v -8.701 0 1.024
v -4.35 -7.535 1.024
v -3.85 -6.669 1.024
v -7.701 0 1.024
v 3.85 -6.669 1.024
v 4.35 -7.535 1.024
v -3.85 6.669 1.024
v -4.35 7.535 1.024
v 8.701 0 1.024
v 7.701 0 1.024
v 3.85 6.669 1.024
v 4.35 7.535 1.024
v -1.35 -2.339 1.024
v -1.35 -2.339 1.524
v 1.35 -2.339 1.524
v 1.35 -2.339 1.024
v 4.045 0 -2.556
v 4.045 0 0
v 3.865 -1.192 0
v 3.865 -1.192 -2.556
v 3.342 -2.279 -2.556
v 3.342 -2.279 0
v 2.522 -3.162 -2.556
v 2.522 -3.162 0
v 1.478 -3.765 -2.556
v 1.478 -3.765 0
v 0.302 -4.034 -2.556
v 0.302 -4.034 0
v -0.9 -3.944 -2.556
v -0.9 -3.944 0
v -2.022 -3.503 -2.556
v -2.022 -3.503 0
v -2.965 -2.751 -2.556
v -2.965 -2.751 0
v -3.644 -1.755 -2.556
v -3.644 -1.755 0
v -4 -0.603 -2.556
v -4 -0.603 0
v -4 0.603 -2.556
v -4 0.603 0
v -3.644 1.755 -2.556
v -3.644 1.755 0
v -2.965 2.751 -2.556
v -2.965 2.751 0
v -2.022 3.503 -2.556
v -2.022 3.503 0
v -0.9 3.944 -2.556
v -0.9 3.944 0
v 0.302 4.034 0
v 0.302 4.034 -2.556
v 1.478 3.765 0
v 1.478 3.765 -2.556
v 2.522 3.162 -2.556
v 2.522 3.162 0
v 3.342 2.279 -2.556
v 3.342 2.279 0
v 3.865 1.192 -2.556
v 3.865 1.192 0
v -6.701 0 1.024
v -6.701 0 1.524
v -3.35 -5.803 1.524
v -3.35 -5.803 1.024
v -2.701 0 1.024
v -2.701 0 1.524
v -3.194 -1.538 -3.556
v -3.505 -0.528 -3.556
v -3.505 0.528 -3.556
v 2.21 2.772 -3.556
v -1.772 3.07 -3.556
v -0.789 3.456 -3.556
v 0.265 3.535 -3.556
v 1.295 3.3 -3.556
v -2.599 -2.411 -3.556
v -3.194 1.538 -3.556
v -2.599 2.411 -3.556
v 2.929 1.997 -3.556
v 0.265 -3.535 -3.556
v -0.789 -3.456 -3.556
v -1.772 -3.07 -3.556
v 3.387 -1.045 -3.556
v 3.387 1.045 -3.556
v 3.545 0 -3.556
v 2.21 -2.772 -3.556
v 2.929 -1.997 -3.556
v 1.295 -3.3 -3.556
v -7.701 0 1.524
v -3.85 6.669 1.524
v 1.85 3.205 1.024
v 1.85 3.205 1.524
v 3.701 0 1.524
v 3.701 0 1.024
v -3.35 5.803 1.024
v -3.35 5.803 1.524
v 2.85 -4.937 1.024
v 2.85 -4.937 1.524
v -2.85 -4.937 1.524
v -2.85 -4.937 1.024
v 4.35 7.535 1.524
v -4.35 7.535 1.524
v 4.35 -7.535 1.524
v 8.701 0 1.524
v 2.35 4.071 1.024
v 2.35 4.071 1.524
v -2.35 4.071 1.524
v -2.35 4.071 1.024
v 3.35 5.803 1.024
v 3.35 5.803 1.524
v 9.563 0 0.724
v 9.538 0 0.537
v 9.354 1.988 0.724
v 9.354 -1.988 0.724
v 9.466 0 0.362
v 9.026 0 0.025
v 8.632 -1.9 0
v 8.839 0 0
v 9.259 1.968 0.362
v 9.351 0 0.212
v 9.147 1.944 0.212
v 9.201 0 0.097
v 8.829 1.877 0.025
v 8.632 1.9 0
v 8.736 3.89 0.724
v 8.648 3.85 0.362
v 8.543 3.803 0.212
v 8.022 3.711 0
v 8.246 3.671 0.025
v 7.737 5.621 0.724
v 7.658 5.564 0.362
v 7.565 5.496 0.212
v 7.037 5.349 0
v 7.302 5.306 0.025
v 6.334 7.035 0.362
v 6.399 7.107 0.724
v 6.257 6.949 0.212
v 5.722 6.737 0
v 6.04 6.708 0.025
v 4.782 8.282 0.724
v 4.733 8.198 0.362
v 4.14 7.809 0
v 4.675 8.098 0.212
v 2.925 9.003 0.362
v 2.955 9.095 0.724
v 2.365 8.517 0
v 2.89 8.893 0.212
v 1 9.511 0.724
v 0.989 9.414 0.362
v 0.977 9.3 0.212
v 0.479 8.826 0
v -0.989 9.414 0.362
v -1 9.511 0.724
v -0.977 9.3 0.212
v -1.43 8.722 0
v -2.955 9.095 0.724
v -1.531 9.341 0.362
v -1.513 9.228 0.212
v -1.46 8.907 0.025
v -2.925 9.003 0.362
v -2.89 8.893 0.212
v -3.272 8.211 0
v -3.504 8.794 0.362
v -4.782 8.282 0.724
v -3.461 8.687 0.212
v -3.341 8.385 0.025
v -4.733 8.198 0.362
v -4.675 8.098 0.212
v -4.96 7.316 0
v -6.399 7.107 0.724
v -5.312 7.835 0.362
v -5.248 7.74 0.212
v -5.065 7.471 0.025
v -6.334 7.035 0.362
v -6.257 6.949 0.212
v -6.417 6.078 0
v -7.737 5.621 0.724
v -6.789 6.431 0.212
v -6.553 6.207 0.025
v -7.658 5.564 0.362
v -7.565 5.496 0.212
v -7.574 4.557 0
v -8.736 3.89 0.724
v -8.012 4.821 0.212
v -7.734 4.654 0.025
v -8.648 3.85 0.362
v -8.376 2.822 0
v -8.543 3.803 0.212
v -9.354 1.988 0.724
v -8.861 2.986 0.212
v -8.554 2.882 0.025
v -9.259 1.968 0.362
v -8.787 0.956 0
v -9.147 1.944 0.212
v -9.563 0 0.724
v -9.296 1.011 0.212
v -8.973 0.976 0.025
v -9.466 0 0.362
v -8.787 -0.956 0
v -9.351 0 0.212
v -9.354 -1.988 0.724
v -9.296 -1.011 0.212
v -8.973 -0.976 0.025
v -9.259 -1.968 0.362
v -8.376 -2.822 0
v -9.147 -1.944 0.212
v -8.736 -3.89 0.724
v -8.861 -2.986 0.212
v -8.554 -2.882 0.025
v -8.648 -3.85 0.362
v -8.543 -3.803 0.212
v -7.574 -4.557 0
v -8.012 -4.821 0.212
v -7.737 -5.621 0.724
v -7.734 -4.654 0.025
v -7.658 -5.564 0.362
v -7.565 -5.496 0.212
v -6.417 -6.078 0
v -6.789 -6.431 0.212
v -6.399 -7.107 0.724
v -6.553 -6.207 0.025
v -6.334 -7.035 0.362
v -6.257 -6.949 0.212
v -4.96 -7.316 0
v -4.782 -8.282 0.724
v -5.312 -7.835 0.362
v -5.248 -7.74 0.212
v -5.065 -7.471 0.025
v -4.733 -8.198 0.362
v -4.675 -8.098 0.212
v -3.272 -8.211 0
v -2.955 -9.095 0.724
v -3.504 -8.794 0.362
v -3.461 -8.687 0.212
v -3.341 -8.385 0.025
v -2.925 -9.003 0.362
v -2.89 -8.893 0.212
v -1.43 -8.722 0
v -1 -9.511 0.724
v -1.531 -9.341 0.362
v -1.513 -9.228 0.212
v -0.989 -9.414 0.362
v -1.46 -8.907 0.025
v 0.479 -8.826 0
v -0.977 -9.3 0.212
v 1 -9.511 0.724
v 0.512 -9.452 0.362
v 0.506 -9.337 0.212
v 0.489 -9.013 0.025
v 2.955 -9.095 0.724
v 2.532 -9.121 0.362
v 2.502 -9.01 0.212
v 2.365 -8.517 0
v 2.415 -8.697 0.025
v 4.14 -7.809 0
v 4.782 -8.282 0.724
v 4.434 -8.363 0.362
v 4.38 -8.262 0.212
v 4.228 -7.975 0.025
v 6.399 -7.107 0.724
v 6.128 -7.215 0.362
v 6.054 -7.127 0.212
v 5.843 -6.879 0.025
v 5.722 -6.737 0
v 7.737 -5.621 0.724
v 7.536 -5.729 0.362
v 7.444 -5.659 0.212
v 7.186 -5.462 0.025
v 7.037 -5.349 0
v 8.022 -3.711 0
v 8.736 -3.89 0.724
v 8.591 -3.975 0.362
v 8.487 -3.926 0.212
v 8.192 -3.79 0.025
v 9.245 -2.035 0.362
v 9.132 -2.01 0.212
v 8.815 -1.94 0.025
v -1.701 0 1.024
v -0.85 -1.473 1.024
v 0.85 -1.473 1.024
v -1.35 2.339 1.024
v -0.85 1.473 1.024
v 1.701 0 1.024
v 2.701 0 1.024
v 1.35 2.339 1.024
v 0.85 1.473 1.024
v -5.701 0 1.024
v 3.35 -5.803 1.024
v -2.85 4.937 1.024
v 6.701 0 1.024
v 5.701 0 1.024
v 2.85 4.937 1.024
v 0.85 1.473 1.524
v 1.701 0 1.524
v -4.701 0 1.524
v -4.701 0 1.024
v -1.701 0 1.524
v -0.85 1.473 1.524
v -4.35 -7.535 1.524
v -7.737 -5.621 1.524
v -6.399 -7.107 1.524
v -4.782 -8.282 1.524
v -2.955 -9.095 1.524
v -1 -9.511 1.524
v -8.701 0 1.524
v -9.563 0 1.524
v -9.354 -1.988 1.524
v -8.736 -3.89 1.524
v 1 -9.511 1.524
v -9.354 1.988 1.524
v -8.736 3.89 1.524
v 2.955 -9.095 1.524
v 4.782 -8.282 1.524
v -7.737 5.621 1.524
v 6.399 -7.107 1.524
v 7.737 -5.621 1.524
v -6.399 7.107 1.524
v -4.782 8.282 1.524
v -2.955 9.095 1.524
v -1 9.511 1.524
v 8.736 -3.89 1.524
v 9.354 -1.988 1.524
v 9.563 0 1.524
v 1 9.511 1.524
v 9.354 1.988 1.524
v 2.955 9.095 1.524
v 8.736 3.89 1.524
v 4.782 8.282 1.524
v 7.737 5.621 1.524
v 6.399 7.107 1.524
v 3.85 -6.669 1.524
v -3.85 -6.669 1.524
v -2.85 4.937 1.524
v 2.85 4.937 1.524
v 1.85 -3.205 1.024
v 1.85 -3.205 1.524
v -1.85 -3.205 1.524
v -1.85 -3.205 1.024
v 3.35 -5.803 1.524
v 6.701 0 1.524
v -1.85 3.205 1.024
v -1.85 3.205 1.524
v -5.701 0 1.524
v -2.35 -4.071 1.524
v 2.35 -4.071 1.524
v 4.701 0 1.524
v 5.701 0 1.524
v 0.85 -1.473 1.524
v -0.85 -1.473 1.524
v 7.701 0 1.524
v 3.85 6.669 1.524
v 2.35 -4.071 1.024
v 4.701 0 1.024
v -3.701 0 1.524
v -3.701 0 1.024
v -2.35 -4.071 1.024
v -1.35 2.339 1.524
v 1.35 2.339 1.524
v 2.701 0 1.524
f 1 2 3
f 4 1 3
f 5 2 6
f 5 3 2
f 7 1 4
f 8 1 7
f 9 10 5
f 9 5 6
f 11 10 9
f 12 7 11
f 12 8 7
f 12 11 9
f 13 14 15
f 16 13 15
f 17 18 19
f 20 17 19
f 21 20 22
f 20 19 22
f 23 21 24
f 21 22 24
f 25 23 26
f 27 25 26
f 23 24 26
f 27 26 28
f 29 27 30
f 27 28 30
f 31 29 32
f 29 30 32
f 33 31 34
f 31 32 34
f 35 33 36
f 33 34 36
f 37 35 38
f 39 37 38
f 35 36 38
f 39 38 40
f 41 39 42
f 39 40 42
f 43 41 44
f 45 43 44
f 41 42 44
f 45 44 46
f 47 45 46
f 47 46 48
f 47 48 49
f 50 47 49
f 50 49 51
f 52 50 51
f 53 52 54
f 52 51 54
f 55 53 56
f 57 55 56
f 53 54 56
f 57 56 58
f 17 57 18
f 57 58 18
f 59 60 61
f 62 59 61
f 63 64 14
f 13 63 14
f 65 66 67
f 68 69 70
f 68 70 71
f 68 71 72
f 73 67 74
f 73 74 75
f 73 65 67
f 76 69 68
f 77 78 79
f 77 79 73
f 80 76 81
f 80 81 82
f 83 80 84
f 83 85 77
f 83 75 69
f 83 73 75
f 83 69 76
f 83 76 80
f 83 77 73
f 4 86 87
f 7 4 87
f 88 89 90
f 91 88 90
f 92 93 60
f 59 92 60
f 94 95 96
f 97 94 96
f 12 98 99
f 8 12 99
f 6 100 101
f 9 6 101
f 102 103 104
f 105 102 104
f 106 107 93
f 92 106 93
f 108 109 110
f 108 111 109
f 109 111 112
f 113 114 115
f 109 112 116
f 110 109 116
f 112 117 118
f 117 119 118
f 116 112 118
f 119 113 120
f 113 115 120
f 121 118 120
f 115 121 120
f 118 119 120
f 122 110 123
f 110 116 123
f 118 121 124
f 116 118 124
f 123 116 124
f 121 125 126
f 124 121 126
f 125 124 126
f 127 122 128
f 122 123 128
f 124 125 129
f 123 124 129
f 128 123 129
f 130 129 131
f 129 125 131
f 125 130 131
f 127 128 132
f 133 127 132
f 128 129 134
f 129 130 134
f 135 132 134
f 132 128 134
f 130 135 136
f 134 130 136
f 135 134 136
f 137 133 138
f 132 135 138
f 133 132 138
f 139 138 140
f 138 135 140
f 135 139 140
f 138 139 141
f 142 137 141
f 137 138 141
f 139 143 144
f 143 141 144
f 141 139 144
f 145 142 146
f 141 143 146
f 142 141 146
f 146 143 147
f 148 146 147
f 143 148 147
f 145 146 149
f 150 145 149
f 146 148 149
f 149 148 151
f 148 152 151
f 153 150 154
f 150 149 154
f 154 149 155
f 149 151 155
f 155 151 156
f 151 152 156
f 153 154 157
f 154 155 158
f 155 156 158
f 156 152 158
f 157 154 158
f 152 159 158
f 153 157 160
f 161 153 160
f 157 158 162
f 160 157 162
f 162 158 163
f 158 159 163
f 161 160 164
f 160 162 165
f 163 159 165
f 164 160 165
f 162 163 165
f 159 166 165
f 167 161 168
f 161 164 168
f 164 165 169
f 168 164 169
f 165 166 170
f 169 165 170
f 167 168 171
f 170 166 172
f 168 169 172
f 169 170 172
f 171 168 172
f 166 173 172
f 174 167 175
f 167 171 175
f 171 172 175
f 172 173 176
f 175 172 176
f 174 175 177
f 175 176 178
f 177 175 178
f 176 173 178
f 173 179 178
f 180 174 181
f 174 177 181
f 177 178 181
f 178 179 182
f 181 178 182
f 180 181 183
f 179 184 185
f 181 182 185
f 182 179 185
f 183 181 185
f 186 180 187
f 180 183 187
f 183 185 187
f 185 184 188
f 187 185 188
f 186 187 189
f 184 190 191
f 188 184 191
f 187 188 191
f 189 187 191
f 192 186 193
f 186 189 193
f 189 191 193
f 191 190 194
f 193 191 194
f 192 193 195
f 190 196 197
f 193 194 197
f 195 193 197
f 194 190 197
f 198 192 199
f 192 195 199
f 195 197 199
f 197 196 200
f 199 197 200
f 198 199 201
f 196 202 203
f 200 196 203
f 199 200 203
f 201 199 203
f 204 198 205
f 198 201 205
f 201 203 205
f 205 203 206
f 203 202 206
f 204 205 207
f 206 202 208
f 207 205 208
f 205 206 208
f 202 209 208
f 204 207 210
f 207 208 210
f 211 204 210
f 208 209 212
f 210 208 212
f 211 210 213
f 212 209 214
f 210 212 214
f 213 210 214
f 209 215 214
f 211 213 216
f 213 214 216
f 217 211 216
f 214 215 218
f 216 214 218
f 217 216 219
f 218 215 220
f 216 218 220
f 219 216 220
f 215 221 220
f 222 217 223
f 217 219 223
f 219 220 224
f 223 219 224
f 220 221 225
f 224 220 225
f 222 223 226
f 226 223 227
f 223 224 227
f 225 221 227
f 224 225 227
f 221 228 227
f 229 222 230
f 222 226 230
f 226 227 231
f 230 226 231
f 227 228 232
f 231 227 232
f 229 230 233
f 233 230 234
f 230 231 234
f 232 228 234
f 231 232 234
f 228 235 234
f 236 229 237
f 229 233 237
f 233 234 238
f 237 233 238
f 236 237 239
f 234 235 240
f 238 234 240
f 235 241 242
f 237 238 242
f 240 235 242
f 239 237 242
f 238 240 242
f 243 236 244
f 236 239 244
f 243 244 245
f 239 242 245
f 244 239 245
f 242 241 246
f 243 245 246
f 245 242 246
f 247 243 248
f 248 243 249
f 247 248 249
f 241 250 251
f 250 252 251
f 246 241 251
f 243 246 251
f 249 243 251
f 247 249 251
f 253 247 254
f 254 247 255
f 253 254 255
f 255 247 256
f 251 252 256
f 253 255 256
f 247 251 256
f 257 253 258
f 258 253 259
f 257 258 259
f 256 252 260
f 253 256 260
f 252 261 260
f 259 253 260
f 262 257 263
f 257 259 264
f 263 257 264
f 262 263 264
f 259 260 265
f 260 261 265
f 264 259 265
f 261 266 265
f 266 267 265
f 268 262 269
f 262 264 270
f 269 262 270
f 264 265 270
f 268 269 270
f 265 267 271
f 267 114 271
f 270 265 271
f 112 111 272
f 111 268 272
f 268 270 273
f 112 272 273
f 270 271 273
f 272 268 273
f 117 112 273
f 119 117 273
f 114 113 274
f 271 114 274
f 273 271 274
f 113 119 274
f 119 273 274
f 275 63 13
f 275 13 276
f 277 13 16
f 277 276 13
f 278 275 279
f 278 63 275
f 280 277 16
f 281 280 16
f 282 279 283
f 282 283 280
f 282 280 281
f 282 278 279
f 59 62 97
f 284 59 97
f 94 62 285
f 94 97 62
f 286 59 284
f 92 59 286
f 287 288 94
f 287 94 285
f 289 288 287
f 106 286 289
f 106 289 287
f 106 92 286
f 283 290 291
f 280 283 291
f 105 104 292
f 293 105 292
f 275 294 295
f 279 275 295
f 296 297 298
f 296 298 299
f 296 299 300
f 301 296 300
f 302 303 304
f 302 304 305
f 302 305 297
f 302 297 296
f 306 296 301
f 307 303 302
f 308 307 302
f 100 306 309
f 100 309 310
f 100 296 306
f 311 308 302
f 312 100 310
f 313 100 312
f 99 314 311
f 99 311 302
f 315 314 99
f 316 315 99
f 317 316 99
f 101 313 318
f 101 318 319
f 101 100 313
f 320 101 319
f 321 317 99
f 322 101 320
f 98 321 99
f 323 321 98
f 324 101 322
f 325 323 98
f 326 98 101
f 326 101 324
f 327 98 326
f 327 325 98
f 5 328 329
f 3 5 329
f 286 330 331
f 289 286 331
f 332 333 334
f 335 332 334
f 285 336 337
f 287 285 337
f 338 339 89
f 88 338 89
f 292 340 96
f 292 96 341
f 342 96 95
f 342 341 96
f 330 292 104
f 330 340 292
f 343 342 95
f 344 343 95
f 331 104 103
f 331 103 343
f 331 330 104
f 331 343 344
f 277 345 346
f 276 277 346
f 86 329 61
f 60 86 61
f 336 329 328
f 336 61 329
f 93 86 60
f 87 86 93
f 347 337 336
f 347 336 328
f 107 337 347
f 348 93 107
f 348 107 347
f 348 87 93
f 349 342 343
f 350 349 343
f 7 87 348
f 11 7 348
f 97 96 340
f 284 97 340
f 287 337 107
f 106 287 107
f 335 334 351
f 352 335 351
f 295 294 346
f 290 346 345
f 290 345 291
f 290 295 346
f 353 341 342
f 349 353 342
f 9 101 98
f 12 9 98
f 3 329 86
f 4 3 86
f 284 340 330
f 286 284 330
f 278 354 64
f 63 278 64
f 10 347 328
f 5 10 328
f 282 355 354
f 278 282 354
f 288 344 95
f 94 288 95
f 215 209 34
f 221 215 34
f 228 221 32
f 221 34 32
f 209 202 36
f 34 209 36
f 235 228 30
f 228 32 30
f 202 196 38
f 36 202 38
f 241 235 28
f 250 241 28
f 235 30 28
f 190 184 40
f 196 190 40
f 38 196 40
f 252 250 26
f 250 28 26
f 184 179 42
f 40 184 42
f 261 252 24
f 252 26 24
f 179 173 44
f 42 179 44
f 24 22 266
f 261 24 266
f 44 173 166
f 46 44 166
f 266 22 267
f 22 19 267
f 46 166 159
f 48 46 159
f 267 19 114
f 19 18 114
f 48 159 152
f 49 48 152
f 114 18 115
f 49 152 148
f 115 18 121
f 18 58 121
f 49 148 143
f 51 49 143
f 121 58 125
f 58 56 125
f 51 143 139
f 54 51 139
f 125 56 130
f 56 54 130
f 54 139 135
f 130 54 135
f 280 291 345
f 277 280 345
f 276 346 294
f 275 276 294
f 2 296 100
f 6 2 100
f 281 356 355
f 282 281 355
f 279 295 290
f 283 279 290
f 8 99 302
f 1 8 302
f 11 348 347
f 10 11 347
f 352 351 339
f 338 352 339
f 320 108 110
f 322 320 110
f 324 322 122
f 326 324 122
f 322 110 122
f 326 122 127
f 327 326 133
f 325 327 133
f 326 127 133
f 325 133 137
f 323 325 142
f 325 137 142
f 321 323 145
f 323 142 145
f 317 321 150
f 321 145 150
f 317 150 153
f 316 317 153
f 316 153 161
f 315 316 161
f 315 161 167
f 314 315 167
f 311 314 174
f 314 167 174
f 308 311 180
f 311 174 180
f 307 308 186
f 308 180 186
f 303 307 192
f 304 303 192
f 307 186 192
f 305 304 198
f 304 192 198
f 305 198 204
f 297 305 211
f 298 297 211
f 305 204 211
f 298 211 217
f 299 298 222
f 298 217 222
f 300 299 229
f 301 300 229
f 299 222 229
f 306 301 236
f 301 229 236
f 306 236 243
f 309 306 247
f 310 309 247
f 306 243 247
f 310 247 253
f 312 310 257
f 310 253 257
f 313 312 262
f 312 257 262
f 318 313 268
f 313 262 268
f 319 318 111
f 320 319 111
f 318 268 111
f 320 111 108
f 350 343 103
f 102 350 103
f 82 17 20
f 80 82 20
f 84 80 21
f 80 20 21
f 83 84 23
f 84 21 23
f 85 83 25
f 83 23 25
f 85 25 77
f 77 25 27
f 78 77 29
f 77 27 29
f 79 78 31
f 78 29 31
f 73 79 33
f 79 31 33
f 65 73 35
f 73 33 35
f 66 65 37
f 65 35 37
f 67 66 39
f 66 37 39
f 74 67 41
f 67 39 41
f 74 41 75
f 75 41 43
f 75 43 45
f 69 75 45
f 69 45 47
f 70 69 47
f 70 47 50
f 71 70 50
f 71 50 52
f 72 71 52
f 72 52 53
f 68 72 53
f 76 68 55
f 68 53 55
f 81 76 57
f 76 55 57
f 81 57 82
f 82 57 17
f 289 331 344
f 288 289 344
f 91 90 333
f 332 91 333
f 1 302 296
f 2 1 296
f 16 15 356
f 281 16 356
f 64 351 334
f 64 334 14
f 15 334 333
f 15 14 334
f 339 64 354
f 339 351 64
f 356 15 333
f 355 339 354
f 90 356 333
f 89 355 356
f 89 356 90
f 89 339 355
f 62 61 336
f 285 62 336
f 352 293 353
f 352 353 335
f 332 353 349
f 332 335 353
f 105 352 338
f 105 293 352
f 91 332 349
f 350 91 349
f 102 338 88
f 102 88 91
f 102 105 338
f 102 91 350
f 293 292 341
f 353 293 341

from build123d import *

# Parameters (mm, degrees)
F0_R     = 9.5631
F1_DEPTH = 1.524
F3_DEPTH = 0.5
F4_R     = 4.04495
F5_DEPTH = 3.556
F6_R     = 0.7242640687
F7_SIZE2 = 1
F7_SIZE  = 0.5


with BuildPart() as f1:
    # F0 (on Top) → F1 (new body)
    with BuildSketch(Plane.XY):
        Circle(F0_R)
    extrude(amount=F1_DEPTH)

    # F2 (on face) → F3 (cut)
    with BuildSketch(Plane.XY.offset(1.524)):
        Polygon((8.7007693222, 0), (4.3503846611, 7.5350872655), (-4.3503846611, 7.5350872655), (-8.7007693222, 0), (-4.3503846611, -7.5350872655), (4.3503846611, -7.5350872655), align=None)
        Polygon((-7.7007693222, 0), (-3.8503846611, 6.6690618617), (3.8503846611, 6.6690618617), (7.7007693222, 0), (3.8503846611, -6.6690618617), (-3.8503846611, -6.6690618617), align=None, mode=Mode.SUBTRACT)
        Polygon((3.3503846611, 5.8030364579), (-3.3503846611, 5.8030364579), (-6.7007693222, 0), (-3.3503846611, -5.8030364579), (3.3503846611, -5.8030364579), (6.7007693222, 0), align=None)
        Polygon((-5.7007693222, 0), (-2.8503846611, 4.9370110541), (2.8503846611, 4.9370110541), (5.7007693222, 0), (2.8503846611, -4.9370110541), (-2.8503846611, -4.9370110541), align=None, mode=Mode.SUBTRACT)
        Polygon((2.3503846611, 4.0709856503), (-2.3503846611, 4.0709856503), (-4.7007693222, 0), (-2.3503846611, -4.0709856503), (2.3503846611, -4.0709856503), (4.7007693222, 0), align=None)
        Polygon((-3.7007693222, 0), (-1.8503846611, 3.2049602465), (1.8503846611, 3.2049602465), (3.7007693222, 0), (1.8503846611, -3.2049602465), (-1.8503846611, -3.2049602465), align=None, mode=Mode.SUBTRACT)
        Polygon((1.3503846611, 2.3389348427), (-1.3503846611, 2.3389348427), (-2.7007693222, 0), (-1.3503846611, -2.3389348427), (1.3503846611, -2.3389348427), (2.7007693222, 0), align=None)
        Polygon((-1.7007693222, 0), (-0.8503846611, 1.472909439), (0.8503846611, 1.472909439), (1.7007693222, 0), (0.8503846611, -1.472909439), (-0.8503846611, -1.472909439), align=None, mode=Mode.SUBTRACT)
    extrude(amount=-F3_DEPTH, mode=Mode.SUBTRACT)

    # F4 (on face) → F5 (join)
    with BuildSketch(Plane(origin=(0, 0, 0), x_dir=(1, 0, 0), z_dir=(0, 0, -1))):
        Circle(F4_R)
    extrude(amount=F5_DEPTH)

    # F6
    f6_edges = [f1.edges().sort_by_distance(p)[0] for p in [
        (-9.5631, 0, 0),
    ]]
    fillet(f6_edges, radius=F6_R)

    # F7
    f7_edges = [f1.edges().sort_by_distance(p)[0] for p in [
        (-4.04495, 0, -3.556),
    ]]
    f7_side = f1.faces().sort_by_distance((0, 0, -3.556))[0]
    chamfer(f7_edges, length=F7_SIZE, length2=F7_SIZE2, reference=f7_side)


solid = f1.part
